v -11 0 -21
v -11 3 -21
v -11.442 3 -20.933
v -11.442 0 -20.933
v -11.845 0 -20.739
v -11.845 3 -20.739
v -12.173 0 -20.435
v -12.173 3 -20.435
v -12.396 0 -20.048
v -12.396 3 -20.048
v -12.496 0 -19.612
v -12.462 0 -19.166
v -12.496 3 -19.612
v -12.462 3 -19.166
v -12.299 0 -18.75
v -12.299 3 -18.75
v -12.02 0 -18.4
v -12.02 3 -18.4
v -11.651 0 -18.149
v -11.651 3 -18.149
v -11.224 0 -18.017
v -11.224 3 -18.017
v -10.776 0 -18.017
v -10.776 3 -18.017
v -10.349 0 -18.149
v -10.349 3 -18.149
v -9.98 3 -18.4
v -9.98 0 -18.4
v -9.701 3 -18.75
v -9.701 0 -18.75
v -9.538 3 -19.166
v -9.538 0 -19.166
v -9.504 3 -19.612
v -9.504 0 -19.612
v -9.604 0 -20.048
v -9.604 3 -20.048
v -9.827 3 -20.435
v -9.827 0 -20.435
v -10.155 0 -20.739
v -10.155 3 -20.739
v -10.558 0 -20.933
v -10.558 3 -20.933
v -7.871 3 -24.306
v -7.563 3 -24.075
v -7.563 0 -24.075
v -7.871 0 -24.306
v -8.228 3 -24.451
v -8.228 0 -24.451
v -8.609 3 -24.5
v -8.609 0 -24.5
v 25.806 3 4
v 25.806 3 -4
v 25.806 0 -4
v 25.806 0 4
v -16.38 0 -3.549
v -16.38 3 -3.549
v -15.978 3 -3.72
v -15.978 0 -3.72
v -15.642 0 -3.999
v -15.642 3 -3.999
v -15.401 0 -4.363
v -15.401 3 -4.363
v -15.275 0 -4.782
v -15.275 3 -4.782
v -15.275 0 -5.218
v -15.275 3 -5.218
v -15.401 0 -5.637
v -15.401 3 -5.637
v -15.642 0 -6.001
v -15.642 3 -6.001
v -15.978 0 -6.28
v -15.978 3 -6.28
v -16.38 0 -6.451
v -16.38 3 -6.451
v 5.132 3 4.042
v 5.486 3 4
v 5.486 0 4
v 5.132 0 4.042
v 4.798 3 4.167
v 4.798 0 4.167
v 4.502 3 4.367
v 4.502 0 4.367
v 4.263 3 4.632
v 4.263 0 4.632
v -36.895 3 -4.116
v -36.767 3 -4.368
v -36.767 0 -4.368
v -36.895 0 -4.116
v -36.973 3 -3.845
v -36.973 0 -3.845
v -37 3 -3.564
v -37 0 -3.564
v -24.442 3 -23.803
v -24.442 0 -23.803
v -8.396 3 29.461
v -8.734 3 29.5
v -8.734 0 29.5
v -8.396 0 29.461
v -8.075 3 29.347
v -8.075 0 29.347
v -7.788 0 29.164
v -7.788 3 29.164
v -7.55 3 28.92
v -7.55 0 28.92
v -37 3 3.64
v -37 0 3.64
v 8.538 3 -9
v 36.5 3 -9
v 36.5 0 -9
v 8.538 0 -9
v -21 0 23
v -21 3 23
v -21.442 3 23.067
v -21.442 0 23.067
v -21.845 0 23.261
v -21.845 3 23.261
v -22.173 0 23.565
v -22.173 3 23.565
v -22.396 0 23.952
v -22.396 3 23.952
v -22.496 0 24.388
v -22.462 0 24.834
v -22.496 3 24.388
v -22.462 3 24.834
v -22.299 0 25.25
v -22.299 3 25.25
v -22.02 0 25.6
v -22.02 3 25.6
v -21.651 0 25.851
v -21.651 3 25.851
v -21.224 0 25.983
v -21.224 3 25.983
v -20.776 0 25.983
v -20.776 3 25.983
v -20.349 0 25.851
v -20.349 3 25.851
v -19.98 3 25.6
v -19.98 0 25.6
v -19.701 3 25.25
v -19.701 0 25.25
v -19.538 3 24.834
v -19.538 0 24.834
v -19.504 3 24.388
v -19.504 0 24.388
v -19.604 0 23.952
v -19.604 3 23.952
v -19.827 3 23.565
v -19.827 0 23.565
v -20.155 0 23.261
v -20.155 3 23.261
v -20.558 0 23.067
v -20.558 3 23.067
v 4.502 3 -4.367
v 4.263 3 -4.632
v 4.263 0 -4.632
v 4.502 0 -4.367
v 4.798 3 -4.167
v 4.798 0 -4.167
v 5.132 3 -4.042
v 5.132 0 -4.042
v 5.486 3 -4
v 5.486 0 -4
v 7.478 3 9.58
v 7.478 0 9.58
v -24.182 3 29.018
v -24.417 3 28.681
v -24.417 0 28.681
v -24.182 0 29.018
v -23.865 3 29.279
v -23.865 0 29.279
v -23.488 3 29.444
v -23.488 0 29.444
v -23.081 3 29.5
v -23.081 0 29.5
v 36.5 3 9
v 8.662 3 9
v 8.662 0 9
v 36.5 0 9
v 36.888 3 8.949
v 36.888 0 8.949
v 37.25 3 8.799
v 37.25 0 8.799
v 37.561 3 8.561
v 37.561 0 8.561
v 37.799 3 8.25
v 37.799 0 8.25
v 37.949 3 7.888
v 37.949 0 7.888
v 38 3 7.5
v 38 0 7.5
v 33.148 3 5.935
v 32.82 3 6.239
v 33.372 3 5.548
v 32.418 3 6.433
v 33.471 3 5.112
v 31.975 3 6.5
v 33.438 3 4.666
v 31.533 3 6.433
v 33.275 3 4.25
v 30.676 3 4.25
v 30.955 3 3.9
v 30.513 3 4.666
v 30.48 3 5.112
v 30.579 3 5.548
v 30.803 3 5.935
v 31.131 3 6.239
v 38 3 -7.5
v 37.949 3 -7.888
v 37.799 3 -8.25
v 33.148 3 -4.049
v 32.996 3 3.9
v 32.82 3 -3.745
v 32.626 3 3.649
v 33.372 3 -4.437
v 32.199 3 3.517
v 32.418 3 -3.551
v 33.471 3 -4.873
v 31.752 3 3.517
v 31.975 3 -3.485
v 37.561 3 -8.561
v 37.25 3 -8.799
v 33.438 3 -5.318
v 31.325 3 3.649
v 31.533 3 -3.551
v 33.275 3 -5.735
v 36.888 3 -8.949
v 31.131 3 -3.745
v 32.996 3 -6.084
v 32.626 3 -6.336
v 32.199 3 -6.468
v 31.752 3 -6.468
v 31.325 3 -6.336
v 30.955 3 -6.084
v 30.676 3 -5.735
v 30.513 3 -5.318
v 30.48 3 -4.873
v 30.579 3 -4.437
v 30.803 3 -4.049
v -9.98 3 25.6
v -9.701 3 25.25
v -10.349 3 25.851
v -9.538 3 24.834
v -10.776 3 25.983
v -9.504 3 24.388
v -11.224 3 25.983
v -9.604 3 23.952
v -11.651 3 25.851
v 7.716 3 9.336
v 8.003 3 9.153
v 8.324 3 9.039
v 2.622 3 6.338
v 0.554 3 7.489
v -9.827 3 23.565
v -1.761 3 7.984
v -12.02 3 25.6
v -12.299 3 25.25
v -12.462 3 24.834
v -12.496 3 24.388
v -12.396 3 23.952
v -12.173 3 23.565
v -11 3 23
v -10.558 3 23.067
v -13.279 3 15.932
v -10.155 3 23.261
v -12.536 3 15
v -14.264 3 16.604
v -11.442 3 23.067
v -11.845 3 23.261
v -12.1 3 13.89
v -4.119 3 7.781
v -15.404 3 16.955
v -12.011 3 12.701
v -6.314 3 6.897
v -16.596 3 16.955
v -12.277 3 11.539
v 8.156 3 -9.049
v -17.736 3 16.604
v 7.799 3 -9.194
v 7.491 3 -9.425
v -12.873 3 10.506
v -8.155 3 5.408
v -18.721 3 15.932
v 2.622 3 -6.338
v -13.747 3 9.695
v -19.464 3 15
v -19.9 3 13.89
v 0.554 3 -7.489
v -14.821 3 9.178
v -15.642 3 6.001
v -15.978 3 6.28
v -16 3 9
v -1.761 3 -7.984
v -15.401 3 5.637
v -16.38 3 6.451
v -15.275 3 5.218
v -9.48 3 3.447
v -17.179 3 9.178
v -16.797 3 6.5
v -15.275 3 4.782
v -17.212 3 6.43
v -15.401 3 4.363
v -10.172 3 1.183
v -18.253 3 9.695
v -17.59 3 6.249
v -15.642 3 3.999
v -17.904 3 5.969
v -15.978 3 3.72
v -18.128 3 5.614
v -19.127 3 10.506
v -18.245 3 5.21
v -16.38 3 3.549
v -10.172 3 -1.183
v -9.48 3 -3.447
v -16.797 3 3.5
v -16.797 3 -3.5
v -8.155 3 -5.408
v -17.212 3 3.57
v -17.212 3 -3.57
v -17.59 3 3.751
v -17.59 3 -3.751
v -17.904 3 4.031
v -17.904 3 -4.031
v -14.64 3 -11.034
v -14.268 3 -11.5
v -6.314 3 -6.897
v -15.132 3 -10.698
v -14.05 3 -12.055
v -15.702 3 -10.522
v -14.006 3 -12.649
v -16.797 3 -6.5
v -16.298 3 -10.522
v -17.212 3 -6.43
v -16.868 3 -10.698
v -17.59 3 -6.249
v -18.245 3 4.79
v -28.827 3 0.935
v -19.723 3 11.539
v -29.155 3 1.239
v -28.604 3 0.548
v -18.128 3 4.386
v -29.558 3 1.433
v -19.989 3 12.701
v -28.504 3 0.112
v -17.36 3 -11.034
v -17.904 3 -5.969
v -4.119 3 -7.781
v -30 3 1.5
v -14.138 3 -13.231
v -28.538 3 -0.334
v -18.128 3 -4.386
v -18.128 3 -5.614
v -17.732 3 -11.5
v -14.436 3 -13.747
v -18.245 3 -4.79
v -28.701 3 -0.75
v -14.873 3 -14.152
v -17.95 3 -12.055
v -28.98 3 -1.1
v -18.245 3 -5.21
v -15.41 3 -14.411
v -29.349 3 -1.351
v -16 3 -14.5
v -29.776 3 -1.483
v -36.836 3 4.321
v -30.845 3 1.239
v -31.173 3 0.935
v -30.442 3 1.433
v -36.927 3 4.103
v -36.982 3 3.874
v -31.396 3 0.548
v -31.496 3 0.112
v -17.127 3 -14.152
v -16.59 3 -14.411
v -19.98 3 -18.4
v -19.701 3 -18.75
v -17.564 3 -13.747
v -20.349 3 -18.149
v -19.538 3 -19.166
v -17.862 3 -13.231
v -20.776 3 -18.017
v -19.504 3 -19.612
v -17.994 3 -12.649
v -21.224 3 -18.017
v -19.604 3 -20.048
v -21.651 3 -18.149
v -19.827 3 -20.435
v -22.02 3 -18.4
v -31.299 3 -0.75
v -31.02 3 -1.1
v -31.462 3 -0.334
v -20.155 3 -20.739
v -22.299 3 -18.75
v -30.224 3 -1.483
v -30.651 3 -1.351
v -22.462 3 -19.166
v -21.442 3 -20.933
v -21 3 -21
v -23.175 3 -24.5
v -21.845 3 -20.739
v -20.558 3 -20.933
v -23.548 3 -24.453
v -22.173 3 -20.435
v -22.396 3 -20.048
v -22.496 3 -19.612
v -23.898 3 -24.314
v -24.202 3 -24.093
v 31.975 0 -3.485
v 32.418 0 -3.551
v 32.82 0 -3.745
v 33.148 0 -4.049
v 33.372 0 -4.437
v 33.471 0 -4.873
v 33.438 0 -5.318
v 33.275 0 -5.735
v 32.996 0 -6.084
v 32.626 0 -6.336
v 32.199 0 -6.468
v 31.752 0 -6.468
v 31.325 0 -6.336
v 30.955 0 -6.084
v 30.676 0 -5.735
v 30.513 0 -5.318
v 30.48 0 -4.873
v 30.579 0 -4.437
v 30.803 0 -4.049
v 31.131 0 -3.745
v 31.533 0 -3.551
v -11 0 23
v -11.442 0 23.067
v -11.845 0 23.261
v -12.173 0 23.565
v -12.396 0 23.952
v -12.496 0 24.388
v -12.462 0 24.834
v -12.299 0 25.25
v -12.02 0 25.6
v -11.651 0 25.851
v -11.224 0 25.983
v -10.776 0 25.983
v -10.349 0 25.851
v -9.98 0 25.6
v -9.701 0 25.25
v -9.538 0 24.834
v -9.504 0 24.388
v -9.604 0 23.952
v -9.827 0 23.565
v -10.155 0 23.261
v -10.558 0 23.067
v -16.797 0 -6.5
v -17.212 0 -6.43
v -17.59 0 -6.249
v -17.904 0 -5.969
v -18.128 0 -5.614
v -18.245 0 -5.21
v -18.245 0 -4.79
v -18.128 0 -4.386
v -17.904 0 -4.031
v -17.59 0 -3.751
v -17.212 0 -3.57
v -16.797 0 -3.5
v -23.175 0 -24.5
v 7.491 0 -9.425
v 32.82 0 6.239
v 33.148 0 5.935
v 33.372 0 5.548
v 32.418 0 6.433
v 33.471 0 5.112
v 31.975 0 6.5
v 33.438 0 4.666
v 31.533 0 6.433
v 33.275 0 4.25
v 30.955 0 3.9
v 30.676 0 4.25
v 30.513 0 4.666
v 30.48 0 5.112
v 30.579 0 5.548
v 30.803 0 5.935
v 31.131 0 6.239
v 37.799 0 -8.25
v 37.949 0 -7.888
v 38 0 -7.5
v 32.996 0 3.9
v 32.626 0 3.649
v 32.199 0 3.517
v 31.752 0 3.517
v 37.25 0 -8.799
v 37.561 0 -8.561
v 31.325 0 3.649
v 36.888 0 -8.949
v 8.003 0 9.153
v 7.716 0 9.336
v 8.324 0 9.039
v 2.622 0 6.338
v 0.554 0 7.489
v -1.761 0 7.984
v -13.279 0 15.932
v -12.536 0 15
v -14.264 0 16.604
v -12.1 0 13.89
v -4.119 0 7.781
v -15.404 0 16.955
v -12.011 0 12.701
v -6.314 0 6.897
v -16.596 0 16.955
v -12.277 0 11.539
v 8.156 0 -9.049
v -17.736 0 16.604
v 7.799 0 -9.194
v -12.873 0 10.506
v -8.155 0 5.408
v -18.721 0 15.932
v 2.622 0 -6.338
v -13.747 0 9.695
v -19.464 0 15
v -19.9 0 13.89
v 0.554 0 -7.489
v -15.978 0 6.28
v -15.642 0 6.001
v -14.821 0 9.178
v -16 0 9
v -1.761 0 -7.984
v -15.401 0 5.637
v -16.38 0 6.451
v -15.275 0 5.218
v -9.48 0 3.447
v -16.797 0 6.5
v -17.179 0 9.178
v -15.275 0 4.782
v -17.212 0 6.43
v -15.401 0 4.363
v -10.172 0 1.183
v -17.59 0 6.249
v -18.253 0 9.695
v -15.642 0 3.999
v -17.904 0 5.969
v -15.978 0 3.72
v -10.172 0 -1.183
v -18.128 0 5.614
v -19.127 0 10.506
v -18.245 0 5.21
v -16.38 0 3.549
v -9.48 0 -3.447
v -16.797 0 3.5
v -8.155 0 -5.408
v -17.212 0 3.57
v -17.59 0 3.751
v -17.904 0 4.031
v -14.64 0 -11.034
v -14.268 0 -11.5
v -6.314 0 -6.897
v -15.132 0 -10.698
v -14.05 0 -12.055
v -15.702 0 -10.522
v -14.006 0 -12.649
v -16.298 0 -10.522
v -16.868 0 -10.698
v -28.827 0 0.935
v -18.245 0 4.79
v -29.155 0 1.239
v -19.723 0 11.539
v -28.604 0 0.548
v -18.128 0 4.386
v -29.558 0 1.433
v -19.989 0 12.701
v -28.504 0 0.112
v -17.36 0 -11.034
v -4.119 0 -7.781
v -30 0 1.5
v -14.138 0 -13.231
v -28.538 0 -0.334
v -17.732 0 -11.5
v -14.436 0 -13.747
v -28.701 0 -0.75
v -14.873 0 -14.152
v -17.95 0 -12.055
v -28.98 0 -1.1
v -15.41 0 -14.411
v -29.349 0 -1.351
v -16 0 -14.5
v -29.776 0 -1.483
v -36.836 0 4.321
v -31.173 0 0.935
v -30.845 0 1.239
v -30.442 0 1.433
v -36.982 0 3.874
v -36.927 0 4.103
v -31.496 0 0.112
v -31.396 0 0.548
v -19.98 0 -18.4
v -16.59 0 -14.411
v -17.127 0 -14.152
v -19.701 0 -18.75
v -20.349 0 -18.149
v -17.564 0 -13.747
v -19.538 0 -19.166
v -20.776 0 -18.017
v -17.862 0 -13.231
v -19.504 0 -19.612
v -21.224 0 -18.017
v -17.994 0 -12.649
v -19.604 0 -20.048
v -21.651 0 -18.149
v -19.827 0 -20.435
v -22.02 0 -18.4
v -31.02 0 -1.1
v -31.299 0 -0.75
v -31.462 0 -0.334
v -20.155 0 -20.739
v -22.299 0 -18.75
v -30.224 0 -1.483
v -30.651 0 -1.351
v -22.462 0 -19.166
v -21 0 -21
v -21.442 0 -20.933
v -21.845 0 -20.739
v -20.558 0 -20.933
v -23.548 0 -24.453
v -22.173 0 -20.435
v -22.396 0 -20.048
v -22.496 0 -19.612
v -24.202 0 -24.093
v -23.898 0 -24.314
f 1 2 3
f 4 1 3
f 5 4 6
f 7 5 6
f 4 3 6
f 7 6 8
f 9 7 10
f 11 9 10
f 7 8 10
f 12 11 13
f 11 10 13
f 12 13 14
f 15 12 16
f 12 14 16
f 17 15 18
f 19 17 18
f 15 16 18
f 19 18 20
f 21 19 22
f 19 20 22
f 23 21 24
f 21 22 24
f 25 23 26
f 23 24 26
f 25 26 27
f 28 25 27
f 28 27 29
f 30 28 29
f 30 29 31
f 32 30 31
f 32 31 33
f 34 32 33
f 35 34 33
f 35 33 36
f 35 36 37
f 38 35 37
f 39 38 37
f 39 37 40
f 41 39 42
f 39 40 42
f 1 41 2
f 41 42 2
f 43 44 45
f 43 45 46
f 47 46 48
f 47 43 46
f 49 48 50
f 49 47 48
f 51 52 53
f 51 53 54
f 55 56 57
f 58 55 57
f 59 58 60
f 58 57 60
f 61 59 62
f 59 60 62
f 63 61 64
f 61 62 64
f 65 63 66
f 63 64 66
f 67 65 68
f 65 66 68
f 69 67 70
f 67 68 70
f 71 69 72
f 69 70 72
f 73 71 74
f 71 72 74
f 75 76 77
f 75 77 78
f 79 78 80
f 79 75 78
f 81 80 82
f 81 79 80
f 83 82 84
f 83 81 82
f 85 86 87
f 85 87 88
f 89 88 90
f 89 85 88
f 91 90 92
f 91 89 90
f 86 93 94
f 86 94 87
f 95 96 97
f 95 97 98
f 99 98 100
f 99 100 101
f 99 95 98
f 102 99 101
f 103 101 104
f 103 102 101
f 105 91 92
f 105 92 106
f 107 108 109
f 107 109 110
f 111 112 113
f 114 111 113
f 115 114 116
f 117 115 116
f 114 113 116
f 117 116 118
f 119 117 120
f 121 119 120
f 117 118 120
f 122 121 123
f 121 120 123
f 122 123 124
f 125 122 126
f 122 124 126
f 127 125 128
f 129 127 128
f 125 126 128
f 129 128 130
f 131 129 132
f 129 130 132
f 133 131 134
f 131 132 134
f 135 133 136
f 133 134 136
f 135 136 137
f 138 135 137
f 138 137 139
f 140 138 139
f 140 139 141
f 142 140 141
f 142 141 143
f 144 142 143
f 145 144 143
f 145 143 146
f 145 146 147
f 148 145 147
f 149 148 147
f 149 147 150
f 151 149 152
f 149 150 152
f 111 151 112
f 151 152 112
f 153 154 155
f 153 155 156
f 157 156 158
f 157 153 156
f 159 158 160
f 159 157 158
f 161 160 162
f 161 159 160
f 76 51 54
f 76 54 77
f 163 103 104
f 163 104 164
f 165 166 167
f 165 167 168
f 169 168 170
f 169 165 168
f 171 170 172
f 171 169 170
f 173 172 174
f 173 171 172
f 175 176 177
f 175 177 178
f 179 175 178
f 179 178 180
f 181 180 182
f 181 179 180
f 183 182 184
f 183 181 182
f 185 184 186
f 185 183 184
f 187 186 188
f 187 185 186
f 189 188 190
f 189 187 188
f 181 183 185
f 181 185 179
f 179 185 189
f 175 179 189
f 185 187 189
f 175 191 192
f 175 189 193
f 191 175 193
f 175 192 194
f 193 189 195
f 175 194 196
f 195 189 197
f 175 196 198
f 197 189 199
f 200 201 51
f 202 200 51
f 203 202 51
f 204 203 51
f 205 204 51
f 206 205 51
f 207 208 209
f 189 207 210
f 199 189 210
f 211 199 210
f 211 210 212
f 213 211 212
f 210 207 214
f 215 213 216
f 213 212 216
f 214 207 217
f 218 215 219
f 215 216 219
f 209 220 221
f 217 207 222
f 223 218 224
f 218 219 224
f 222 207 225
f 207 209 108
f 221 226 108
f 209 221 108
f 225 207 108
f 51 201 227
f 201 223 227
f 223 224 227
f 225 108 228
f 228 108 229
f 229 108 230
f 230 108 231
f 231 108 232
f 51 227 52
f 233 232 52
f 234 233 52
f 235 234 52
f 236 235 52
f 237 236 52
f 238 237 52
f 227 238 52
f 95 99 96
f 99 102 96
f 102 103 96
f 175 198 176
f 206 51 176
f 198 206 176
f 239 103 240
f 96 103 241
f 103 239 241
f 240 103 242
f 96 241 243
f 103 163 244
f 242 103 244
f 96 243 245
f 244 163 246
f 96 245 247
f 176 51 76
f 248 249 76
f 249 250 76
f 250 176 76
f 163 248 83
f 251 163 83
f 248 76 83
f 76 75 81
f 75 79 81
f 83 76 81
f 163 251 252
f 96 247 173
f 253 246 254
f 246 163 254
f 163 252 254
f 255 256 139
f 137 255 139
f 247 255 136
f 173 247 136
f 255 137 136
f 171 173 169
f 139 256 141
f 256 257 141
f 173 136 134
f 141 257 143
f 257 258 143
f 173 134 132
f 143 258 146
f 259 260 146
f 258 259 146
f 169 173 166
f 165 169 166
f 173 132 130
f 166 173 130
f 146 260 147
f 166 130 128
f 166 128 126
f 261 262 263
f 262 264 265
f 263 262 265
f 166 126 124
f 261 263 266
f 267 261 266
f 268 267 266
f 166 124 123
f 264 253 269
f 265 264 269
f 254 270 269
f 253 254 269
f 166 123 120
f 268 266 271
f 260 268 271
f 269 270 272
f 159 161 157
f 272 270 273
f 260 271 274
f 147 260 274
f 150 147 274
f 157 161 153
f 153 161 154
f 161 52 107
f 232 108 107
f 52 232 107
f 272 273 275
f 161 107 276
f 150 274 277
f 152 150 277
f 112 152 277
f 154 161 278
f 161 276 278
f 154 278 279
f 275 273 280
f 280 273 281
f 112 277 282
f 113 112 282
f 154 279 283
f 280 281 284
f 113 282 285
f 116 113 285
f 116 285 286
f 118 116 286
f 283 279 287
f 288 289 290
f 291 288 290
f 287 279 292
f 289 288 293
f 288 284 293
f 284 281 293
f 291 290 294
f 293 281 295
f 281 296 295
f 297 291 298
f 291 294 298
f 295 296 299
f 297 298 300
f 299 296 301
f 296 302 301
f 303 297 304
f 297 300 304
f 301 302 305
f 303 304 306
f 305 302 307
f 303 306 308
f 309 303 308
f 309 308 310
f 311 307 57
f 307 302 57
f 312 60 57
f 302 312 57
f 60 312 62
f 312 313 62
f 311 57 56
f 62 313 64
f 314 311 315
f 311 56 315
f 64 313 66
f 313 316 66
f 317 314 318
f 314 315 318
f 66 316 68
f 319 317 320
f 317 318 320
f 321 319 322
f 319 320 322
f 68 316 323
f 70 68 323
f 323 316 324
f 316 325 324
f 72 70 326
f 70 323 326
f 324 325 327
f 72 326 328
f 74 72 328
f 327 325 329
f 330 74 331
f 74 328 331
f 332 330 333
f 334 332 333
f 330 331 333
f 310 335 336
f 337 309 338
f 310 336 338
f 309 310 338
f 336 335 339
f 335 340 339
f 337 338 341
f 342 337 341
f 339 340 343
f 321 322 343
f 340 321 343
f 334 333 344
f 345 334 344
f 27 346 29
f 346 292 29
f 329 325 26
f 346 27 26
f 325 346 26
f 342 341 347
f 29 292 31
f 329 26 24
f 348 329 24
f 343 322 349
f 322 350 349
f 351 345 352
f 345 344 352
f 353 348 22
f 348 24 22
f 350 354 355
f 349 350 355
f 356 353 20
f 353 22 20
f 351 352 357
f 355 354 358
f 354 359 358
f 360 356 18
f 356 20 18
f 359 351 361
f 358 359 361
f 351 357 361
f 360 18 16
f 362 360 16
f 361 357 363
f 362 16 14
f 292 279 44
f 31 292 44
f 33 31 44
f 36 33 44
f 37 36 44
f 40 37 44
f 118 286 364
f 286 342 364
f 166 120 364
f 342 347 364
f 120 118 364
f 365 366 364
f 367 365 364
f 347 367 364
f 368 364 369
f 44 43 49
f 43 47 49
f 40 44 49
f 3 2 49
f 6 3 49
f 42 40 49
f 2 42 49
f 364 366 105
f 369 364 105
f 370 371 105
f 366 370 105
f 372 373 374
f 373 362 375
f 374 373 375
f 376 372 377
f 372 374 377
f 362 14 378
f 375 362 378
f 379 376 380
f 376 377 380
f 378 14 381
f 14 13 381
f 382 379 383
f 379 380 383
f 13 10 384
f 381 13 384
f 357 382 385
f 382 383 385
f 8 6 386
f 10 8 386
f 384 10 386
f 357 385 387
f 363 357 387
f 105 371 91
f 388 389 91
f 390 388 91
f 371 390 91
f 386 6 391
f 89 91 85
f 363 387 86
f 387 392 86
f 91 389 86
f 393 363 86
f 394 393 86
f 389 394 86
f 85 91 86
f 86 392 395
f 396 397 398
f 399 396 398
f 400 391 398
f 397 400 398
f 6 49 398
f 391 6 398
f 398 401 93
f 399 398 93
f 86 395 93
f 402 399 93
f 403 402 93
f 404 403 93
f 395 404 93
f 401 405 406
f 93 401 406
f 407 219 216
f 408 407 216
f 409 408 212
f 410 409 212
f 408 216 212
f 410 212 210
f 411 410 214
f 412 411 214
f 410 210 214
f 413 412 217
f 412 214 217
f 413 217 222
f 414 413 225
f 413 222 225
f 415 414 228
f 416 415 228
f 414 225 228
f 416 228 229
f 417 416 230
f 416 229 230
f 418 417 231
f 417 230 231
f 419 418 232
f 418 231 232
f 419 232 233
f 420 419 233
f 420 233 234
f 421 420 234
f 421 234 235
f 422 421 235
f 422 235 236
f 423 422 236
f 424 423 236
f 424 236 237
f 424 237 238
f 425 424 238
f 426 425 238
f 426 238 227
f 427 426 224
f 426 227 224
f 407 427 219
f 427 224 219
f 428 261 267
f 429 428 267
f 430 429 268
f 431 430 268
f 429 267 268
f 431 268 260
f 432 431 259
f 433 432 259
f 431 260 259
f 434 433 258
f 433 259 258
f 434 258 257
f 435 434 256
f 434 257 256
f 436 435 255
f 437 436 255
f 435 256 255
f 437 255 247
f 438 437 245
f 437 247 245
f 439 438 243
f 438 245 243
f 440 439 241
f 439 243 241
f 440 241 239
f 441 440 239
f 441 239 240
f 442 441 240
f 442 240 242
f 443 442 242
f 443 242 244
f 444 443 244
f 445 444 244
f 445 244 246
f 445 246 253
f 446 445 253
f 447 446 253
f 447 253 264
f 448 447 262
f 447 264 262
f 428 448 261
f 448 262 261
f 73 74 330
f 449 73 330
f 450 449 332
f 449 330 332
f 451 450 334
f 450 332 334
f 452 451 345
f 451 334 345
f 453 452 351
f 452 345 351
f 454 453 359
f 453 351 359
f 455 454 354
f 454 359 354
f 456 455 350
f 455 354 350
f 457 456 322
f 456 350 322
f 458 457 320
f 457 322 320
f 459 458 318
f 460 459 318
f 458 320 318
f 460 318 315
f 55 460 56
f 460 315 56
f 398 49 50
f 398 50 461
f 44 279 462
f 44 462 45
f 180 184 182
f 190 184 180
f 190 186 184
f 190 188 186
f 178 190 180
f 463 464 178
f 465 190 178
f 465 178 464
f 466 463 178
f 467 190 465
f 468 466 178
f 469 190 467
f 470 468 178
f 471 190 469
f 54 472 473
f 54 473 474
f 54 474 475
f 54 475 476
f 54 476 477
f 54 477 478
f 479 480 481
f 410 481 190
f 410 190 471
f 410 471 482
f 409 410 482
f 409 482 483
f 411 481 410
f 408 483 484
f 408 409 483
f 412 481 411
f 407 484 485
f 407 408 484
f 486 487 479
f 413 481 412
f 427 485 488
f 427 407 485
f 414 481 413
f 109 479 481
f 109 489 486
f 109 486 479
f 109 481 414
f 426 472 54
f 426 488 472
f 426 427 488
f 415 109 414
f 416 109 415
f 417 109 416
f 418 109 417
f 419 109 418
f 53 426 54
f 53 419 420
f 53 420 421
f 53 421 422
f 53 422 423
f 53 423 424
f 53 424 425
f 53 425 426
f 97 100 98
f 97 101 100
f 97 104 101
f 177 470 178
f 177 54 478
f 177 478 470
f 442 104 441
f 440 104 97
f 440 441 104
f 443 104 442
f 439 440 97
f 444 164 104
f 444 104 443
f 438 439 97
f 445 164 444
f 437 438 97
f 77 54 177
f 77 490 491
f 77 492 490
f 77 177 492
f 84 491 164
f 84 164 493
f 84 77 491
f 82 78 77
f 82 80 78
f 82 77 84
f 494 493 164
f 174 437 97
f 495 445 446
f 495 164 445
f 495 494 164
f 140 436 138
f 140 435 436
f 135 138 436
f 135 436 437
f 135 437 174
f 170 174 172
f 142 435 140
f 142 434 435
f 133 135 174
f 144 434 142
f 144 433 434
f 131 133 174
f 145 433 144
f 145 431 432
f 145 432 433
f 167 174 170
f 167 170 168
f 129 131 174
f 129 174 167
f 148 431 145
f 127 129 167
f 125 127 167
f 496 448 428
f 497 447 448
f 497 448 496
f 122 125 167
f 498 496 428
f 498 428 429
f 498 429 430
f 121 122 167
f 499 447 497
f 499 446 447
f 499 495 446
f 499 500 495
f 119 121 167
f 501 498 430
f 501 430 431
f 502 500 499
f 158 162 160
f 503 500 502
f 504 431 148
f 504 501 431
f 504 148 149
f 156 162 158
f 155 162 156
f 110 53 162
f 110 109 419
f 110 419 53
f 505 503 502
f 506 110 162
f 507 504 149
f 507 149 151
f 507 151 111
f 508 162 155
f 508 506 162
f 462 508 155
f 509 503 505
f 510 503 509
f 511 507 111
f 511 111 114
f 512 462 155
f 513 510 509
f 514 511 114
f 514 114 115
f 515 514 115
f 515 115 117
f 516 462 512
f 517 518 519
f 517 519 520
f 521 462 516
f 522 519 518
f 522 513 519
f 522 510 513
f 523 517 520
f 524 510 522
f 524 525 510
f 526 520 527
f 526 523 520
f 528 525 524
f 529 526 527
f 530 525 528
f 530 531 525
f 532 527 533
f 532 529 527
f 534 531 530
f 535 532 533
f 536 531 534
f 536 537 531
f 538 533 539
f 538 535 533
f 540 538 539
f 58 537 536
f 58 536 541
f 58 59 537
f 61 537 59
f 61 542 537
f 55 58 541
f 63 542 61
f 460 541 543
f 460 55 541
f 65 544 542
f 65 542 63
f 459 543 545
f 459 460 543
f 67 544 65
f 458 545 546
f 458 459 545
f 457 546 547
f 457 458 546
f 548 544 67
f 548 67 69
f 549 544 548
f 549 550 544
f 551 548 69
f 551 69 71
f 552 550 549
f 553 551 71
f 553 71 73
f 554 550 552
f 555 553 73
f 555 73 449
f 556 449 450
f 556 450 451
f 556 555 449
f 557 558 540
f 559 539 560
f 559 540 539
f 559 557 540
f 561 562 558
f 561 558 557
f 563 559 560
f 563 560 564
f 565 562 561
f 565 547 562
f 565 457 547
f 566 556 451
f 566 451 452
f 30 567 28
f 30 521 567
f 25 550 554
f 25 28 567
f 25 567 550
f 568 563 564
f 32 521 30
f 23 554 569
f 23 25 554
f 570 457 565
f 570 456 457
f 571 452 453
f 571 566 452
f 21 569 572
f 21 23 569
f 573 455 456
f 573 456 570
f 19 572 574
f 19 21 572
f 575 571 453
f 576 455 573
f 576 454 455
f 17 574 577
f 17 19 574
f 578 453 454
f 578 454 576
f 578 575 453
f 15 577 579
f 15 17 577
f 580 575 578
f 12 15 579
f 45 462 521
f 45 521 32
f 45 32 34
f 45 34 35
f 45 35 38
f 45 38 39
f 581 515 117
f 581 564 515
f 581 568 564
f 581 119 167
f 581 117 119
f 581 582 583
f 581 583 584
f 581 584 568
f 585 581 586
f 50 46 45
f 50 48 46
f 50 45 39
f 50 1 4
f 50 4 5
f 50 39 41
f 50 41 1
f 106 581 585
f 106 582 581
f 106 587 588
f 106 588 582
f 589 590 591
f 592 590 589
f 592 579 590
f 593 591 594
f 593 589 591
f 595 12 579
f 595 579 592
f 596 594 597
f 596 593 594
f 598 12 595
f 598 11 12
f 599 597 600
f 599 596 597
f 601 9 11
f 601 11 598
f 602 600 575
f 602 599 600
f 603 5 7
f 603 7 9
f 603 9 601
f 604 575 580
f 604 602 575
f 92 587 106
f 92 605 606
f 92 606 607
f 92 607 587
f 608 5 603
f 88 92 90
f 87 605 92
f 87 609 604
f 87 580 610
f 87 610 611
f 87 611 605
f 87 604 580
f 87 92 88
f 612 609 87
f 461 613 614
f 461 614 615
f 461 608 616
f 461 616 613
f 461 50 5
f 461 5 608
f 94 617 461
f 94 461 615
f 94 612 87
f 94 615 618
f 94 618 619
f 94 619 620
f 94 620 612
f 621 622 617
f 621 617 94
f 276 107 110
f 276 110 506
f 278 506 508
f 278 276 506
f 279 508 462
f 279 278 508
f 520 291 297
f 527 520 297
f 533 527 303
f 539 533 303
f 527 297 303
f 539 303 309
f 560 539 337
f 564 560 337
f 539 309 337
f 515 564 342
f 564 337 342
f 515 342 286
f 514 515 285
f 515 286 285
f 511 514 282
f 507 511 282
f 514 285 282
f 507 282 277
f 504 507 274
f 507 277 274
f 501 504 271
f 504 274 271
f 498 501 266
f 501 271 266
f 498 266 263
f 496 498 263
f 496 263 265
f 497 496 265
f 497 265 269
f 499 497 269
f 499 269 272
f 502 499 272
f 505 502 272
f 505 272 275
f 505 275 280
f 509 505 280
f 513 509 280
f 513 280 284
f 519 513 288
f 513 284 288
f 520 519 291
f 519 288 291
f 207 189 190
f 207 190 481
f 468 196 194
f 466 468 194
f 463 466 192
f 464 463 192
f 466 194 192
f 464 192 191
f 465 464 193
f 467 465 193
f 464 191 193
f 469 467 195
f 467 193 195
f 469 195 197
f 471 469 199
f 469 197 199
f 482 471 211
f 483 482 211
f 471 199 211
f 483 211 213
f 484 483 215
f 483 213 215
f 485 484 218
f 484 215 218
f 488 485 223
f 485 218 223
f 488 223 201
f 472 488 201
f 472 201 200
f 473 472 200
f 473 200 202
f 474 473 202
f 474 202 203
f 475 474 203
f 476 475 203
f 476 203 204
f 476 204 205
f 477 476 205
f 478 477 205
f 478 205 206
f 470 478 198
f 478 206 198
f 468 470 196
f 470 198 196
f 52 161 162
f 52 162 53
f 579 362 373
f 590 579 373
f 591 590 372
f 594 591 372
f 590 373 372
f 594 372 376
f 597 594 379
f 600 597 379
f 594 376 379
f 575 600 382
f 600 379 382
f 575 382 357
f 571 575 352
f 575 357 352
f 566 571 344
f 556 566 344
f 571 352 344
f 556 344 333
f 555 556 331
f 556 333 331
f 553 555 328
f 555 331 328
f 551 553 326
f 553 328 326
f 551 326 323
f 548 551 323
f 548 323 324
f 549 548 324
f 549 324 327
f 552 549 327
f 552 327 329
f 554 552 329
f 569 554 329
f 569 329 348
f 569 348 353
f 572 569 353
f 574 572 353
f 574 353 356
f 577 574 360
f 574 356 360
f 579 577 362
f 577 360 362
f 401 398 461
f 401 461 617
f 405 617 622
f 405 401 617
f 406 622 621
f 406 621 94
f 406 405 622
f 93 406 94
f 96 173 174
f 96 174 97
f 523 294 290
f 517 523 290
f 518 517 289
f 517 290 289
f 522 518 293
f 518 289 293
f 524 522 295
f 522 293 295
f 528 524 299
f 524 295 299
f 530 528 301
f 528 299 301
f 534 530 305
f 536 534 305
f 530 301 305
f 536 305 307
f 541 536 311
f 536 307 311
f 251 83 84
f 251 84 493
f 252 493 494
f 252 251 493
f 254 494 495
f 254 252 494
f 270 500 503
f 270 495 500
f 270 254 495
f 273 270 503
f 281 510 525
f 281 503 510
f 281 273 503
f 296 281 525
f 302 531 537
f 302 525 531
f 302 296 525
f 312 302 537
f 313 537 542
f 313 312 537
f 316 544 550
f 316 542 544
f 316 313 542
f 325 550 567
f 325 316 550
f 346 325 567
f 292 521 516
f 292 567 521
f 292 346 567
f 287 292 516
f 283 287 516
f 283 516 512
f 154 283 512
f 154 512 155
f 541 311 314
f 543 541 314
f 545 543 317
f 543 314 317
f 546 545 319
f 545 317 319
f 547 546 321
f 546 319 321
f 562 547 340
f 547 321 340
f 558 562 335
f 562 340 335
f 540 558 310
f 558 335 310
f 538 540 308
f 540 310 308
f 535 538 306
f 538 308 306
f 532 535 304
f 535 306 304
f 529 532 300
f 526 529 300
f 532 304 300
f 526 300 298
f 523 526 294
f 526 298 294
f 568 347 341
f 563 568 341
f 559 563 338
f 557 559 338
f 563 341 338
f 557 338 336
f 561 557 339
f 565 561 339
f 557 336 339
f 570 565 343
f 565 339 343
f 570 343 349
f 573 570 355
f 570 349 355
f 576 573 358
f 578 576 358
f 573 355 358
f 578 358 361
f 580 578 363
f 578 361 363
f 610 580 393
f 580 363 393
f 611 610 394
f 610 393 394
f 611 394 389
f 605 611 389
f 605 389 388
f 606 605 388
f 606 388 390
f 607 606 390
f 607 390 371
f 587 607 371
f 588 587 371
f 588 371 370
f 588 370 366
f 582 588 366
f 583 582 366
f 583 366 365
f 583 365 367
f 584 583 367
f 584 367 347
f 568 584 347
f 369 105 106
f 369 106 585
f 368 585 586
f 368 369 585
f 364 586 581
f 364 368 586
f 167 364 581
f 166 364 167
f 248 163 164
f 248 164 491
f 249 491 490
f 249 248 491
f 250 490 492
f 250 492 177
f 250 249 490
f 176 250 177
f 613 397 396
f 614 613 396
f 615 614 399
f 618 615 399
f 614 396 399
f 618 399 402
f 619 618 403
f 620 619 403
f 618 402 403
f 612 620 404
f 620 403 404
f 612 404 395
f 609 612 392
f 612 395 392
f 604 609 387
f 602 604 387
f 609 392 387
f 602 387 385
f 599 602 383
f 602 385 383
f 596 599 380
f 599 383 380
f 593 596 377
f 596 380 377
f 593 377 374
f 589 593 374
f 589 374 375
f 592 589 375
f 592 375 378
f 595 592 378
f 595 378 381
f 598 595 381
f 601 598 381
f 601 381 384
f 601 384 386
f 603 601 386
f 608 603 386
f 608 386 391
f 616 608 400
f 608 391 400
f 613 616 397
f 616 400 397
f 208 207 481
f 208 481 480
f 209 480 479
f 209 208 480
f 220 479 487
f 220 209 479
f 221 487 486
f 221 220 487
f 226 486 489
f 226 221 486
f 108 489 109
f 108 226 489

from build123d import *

# Parameters (mm, degrees)
ESQUISSE1_R             = 1.5
ESQUISSE1_R_2           = 2
ESQUISSE1_R_3           = 4
BOSS_EXTRU_1_DEPTH      = 3
ESQUISSE4_R             = 2.563154281
ESQUISSE4_W             = 9.437600028
ESQUISSE4_H             = 17.69995175
BOSS_EXTRU_3_DEPTH      = 3
ESQUISSE5_R             = 1.5
ENL_V_MAT_EXTRU_1_DEPTH = 10
ESQUISSE6_R             = 1.5
BOSS_EXTRU_5_DEPTH      = 3
ESQUISSE7_R             = 1.5
ENL_V_MAT_EXTRU_2_DEPTH = 3
ESQUISSE8_R             = 1.5
ENL_V_MAT_EXTRU_3_DEPTH = 3
BOSS_EXTRU_7_DEPTH      = 3


with BuildPart() as part:
    # Esquisse1 → Boss.-Extru.1 (new body)
    with BuildSketch(Plane(origin=(0, 3, 0), x_dir=(1, 0, 0), z_dir=(0, 1, 0))):
        with BuildLine():
            Line((-24.441801488, 23.803313038), (-36.766762868, 4.367797016))
            ThreePointArc((-36.766762868, 4.367797016), (-36.940511073, 3.982727746), (-37, 3.564483978))
            Line((-37, 3.564483978), (-37, -3.639706512))
            ThreePointArc((-37, -3.639706512), (-36.958516169, -3.990035764), (-36.83635922, -4.320987683))
            Line((-36.83635922, -4.320987683), (-24.41738607, -28.681281171))
            ThreePointArc((-24.41738607, -28.681281171), (-23.864633333, -29.279046863), (-23.081026849, -29.5))
            Line((-23.081026849, -29.5), (-8.734084726, -29.5))
            ThreePointArc((-8.734084726, -29.5), (-8.074724869, -29.347310127), (-7.549601775, -28.920326105))
            Line((-7.549601775, -28.920326105), (7.477805006, -9.579673895))
            ThreePointArc((7.477805006, -9.579673895), (8.002928099, -9.152689873), (8.662287956, -9))
            Line((8.662287956, -9), (36.5, -9))
            ThreePointArc((36.5, -9), (37.560660172, -8.560660172), (38, -7.5))
            Line((38, -7.5), (38, 7.5))
            ThreePointArc((38, 7.5), (37.560660172, 8.560660172), (36.5, 9))
            Line((36.5, 9), (8.537585972, 9))
            ThreePointArc((8.537585972, 9), (7.973014245, 9.110302635), (7.491474184, 9.424988313))
            Line((7.491474184, 9.424988313), (-7.563270954, 24.075011687))
            ThreePointArc((-7.563270954, 24.075011687), (-8.044811015, 24.389697365), (-8.609382741, 24.5))
            Line((-8.609382741, 24.5), (-23.17503862, 24.5))
            ThreePointArc((-23.17503862, 24.5), (-23.897890764, 24.314338152), (-24.441801488, 23.803313038))
        make_face()
        with Locations(Location((33, -5, 0), (0, 0, 90))):
            Circle(ESQUISSE1_R, mode=Mode.SUBTRACT)
        with Locations(Location((-16, 12.5, 0), (0, 0, 90))):
            Circle(ESQUISSE1_R_2, mode=Mode.SUBTRACT)
        with Locations(Location((-21, -24.5, 0), (0, 0, 90))):
            Circle(ESQUISSE1_R, mode=Mode.SUBTRACT)
        with Locations(Location((-21, 19.5, 0), (0, 0, 90))):
            Circle(ESQUISSE1_R, mode=Mode.SUBTRACT)
        with Locations(Location((-16, -5, 0), (0, 0, 90))):
            Circle(ESQUISSE1_R, mode=Mode.SUBTRACT)
        with Locations(Location((-16, 5, 0), (0, 0, 90))):
            Circle(ESQUISSE1_R, mode=Mode.SUBTRACT)
        with Locations(Location((-11, 19.5, 0), (0, 0, 90))):
            Circle(ESQUISSE1_R, mode=Mode.SUBTRACT)
        with Locations(Location((-11, -24.5, 0), (0, 0, 90))):
            Circle(ESQUISSE1_R, mode=Mode.SUBTRACT)
        with Locations(Location((-32, 0, 0), (0, 0, 90))):
            Circle(ESQUISSE1_R, mode=Mode.SUBTRACT)
        with Locations(Location((-16, -13, 0), (0, 0, 90))):
            Circle(ESQUISSE1_R_3, mode=Mode.SUBTRACT)
        with Locations(Location((33, 5, 0), (0, 0, 90))):
            Circle(ESQUISSE1_R, mode=Mode.SUBTRACT)
        with BuildLine():
            Line((-26.75, -5), (-26.75, 5))
            ThreePointArc((-26.75, 5), (-26.017766953, 6.767766953), (-24.25, 7.5))
            Line((-24.25, 7.5), (-21.75, 7.5))
            ThreePointArc((-21.75, 7.5), (-19.982233047, 6.767766953), (-19.25, 5))
            Line((-19.25, 5), (-19.25, -5))
            ThreePointArc((-19.25, -5), (-19.982233047, -6.767766953), (-21.75, -7.5))
            Line((-21.75, -7.5), (-24.25, -7.5))
            ThreePointArc((-24.25, -7.5), (-26.017766953, -6.767766953), (-26.75, -5))
        make_face(mode=Mode.SUBTRACT)
        with BuildLine():
            Line((27.25, 2.5), (27.25, -2.5))
            ThreePointArc((27.25, -2.5), (26.810660172, -3.560660172), (25.75, -4))
            Line((25.75, -4), (7.745966692, -4))
            ThreePointArc((7.745966692, -4), (7.057719491, -4.167215025), (6.52291932, -4.631578947))
            ThreePointArc((6.52291932, -4.631578947), (-8, 0), (6.52291932, 4.631578947))
            ThreePointArc((6.52291932, 4.631578947), (7.057719491, 4.167215025), (7.745966692, 4))
            Line((7.745966692, 4), (25.75, 4))
            ThreePointArc((25.75, 4), (26.810660172, 3.560660172), (27.25, 2.5))
        make_face(mode=Mode.SUBTRACT)
    extrude(amount=-BOSS_EXTRU_1_DEPTH)

    # Esquisse4 → Boss.-Extru.3 (add)
    with BuildSketch(Plane(origin=(0, 3, 0), x_dir=(1, 0, 0), z_dir=(0, 1, 0))):
        with Locations((-32, 0)):
            Circle(ESQUISSE4_R)
        with BuildLine():
            Line((-8.428765835, 5.31043864), (-10.28347554, 5.31043864))
            Line((-10.28347554, 5.31043864), (-10.28347554, -6.18848711))
            Line((-10.28347554, -6.18848711), (-7.806886661, -6.18848711))
            ThreePointArc((-7.806886661, -6.18848711), (0, -9.96217105), (7.806886661, -6.18848711))
            Line((7.806886661, -6.18848711), (29.357557964, -6.18848711))
            Line((29.357557964, -6.18848711), (29.357557964, 5.31043864))
            Line((29.357557964, 5.31043864), (8.428765835, 5.31043864))
            ThreePointArc((8.428765835, 5.31043864), (0, 9.96217105), (-8.428765835, 5.31043864))
        make_face()
        with Locations((-22.804360287, -0.041920648)):
            Rectangle(ESQUISSE4_W, ESQUISSE4_H)
    extrude(amount=-BOSS_EXTRU_3_DEPTH)

    # Esquisse5 → Enlèv. mat.-Extru.1 (cut)
    with BuildSketch(Plane(origin=(0, 3, 0), x_dir=(1, 0, 0), z_dir=(0, 1, 0))):
        with Locations(Location((-30, 0, 0), (0, 0, 270))):
            Circle(ESQUISSE5_R)
        with BuildLine():
            Line((5.485812833, 4), (25.805812833, 4))
            Line((25.805812833, 4), (25.805812833, -4))
            Line((25.805812833, -4), (5.485812833, -4))
            ThreePointArc((5.485812833, -4), (4.797565631, -4.167215025), (4.26276546, -4.631578947))
            ThreePointArc((4.26276546, -4.631578947), (-10.26015386, 0), (4.26276546, 4.631578947))
            ThreePointArc((4.26276546, 4.631578947), (4.797565631, 4.167215025), (5.485812833, 4))
        make_face()
    extrude(amount=-ENL_V_MAT_EXTRU_1_DEPTH, mode=Mode.SUBTRACT)

    # Esquisse6 → Boss.-Extru.5 (add)
    with BuildSketch(Plane(origin=(0, 3, 0), x_dir=(1, 0, 0), z_dir=(0, 1, 0))):
        with Locations((33, 5)):
            Circle(ESQUISSE6_R)
        with Locations((33, -5)):
            Circle(ESQUISSE6_R)
    extrude(amount=-BOSS_EXTRU_5_DEPTH)

    # Esquisse7 → Enlèv. mat.-Extru.2 (cut)
    with BuildSketch(Plane(origin=(0, 3, 0), x_dir=(1, 0, 0), z_dir=(0, 1, 0))):
        with Locations(Location((31.975486082, 4.984695173, 0), (0, 0, 270))):
            Circle(ESQUISSE7_R)
        with Locations(Location((31.975486082, -5, 0), (0, 0, 270))):
            Circle(ESQUISSE7_R)
    extrude(amount=-ENL_V_MAT_EXTRU_2_DEPTH, mode=Mode.SUBTRACT)

    # Esquisse8 → Enlèv. mat.-Extru.3 (cut)
    with BuildSketch(Plane(origin=(0, 3, 0), x_dir=(1, 0, 0), z_dir=(0, 1, 0))):
        with Locations((-16.759449345, 5)):
            Circle(ESQUISSE8_R)
        with Locations((-16, 5)):
            Circle(ESQUISSE8_R)
        with Locations((-16.759449345, -5)):
            Circle(ESQUISSE8_R)
        with Locations((-16, -5)):
            Circle(ESQUISSE8_R)
    extrude(amount=-ENL_V_MAT_EXTRU_3_DEPTH, mode=Mode.SUBTRACT)

    # Esquisse10 → Boss.-Extru.7 (add)
    with BuildSketch(Plane(origin=(0, 3, 0), x_dir=(1, 0, 0), z_dir=(0, 1, 0))):
        with BuildLine():
            ThreePointArc((-16.379724673, 3.548859355), (-15.259449345, 5), (-16.379724673, 6.451140645))
            ThreePointArc((-16.379724673, 6.451140645), (-14.5, 5), (-16.379724673, 3.548859355))
        make_face()
        with BuildLine():
            ThreePointArc((-16.379724673, -6.451140645), (-15.259449345, -5), (-16.379724673, -3.548859355))
            ThreePointArc((-16.379724673, -3.548859355), (-14.5, -5), (-16.379724673, -6.451140645))
        make_face()
    extrude(amount=-BOSS_EXTRU_7_DEPTH)


solid = part.part
